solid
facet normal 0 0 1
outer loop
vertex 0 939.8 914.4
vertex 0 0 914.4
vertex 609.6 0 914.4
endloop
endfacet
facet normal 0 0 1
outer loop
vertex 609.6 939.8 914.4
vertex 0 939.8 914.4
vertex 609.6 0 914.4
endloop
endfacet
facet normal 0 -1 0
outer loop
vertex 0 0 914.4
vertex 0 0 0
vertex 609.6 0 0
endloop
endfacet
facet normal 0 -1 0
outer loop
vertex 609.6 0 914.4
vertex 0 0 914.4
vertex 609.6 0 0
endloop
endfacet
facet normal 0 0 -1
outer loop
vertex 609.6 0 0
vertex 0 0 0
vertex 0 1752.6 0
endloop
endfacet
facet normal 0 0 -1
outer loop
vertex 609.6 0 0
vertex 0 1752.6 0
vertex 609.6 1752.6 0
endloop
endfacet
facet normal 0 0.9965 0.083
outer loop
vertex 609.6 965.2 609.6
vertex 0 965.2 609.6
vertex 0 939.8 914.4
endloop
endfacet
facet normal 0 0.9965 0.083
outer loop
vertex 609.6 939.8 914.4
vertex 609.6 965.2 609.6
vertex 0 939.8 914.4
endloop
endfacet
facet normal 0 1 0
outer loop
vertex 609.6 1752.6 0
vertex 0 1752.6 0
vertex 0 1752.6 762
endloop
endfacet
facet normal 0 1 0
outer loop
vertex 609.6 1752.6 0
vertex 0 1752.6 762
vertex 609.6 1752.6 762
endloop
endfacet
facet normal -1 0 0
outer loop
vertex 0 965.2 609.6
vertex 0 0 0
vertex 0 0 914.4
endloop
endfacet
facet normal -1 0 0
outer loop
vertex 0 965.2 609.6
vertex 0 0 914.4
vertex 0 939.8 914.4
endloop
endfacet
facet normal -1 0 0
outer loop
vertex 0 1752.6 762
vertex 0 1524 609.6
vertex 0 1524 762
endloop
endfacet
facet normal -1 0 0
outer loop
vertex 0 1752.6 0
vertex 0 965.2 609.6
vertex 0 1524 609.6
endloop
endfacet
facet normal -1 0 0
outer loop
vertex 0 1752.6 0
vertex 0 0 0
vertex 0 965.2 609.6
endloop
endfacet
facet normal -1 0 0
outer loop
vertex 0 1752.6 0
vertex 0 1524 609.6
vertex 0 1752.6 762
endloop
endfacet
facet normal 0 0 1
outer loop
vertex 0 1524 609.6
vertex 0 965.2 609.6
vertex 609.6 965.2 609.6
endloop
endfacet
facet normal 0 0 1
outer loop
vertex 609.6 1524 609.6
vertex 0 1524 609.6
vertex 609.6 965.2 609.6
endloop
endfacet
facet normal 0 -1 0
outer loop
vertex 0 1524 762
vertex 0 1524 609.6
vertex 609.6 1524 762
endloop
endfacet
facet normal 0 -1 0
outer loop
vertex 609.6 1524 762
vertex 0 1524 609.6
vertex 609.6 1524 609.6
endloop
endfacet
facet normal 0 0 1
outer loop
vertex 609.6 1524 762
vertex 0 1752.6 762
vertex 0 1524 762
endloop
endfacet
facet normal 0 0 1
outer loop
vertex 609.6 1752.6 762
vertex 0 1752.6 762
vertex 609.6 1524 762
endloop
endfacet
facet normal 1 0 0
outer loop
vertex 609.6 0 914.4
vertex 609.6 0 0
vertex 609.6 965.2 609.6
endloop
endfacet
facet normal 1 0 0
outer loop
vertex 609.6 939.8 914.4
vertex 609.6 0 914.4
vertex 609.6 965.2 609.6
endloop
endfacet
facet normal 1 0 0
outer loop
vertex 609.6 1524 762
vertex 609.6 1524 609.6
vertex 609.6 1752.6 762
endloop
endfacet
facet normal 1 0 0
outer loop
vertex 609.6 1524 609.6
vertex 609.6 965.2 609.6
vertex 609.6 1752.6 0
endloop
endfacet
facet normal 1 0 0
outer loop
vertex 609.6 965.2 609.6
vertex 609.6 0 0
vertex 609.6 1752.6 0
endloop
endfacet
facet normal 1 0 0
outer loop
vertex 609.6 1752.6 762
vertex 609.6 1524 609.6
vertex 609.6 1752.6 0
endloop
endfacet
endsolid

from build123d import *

# Parameters (mm, degrees)
SKETCH1_W           = 609.6
SKETCH1_H           = 914.4
BOSS_EXTRUDE1_DEPTH = 939.8
SKETCH2_W           = 609.6
SKETCH2_H           = 304.8
BOSS_EXTRUDE2_DEPTH = 25.4
CUT_EXTRUDE1_DEPTH  = 610.6
SKETCH4_W           = 609.6
SKETCH4_H           = 609.6
BOSS_EXTRUDE3_DEPTH = 25.4
SKETCH5_W           = 609.6
SKETCH5_H           = 609.6
BOSS_EXTRUDE4_DEPTH = 558.8
SKETCH6_W           = 609.6
SKETCH6_H           = 609.6
BOSS_EXTRUDE5_DEPTH = 228.6
SKETCH7_W           = 609.6
SKETCH7_H           = 228.6
BOSS_EXTRUDE6_DEPTH = 152.4


with BuildPart() as part:
    # Sketch1 → Boss-Extrude1 (new body)
    with BuildSketch(Plane(origin=(0, 0, 0), x_dir=(1, 0, 0), z_dir=(0, 1, 0))):
        with Locations((304.8, -457.2)):
            Rectangle(SKETCH1_W, SKETCH1_H)
    extrude(amount=BOSS_EXTRUDE1_DEPTH)

    # Sketch2 → Boss-Extrude2 (add)
    with BuildSketch(Plane(origin=(0, 939.8, 0), x_dir=(1, 0, 0), z_dir=(0, 1, 0))):
        with Locations((304.8, -762)):
            Rectangle(SKETCH2_W, SKETCH2_H)
    extrude(amount=BOSS_EXTRUDE2_DEPTH)

    # Sketch3 → Cut-Extrude1 (cut, through all)
    with BuildSketch(Plane.ZY):
        Polygon((609.6, 965.2), (914.4, 939.8), (914.4, 965.2), align=None)
    extrude(amount=-CUT_EXTRUDE1_DEPTH, mode=Mode.SUBTRACT)

    # Sketch4 → Boss-Extrude3 (add)
    with BuildSketch(Plane(origin=(0, 939.8, 0), x_dir=(1, 0, 0), z_dir=(0, 1, 0))):
        with Locations((304.8, -304.8)):
            Rectangle(SKETCH4_W, SKETCH4_H)
    extrude(amount=BOSS_EXTRUDE3_DEPTH)

    # Sketch5 → Boss-Extrude4 (add)
    with BuildSketch(Plane(origin=(0, 965.2, 0), x_dir=(1, 0, 0), z_dir=(0, 1, 0))):
        with Locations((304.8, -304.8)):
            Rectangle(SKETCH5_W, SKETCH5_H)
    extrude(amount=BOSS_EXTRUDE4_DEPTH)

    # Sketch6 → Boss-Extrude5 (add)
    with BuildSketch(Plane(origin=(0, 1524, 0), x_dir=(1, 0, 0), z_dir=(0, 1, 0))):
        with Locations((304.8, -304.8)):
            Rectangle(SKETCH6_W, SKETCH6_H)
    extrude(amount=BOSS_EXTRUDE5_DEPTH)

    # Sketch7 → Boss-Extrude6 (add)
    with BuildSketch(Plane.XY.offset(609.6)):
        with Locations((304.8, 1638.3)):
            Rectangle(SKETCH7_W, SKETCH7_H)
    extrude(amount=BOSS_EXTRUDE6_DEPTH)


solid = part.part
